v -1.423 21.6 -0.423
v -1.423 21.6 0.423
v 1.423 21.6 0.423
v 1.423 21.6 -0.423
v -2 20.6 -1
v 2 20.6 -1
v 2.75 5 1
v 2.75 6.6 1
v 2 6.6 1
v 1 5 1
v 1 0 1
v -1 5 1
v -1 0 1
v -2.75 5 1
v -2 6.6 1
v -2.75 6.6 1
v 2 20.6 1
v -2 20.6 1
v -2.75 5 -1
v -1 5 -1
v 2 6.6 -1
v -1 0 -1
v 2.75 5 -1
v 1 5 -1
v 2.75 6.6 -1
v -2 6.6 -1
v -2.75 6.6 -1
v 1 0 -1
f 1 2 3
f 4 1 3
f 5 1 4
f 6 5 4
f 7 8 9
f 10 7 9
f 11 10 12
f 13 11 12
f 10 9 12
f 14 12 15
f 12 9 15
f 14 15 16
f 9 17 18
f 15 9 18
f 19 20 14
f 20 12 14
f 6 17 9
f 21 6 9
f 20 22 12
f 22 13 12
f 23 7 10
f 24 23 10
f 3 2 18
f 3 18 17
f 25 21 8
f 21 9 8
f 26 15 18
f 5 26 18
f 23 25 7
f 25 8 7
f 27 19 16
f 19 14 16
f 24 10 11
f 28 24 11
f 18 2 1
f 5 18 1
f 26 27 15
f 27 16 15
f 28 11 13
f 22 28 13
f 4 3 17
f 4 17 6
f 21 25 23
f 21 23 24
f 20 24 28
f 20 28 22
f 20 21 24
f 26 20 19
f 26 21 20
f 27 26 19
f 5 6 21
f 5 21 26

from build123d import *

# Parameters (mm, degrees)
EXTRUDE_1_DEPTH        = 1
CHAMFER_1_SIZE         = 1
CHAMFER_1_SIZE2        = 0.577350269
CHAMFER_1_PART_2_SIZE  = 1
CHAMFER_1_PART_2_SIZE2 = 0.577350269
CHAMFER_1_PART_3_SIZE  = 1
CHAMFER_1_PART_3_SIZE2 = 0.577350269
CHAMFER_1_PART_4_SIZE  = 1
CHAMFER_1_PART_4_SIZE2 = 0.577350269


with BuildPart() as part:
    # Эскиз1 → Бобышка-Вытянуть1 (new body, symmetric)
    with BuildSketch(Plane.XY):
        Polygon((1, 0), (-1, 0), (-1, 5), (-2.75, 5), (-2.75, 6.6), (-2, 6.6), (-2, 21.6), (2, 21.6), (2, 6.6), (2.75, 6.6), (2.75, 5), (1, 5), align=None)
    extrude(amount=EXTRUDE_1_DEPTH, both=True)

    # Фаска1
    chamfer_1_edges = [part.edges().sort_by_distance(p)[0] for p in [
        (0, 21.6, -1),
    ]]
    chamfer_1_side = [part.faces().sort_by_distance(p)[0] for p in [
        (0, 11.701015228, -1),
    ]]
    chamfer(chamfer_1_edges, length=CHAMFER_1_SIZE, length2=CHAMFER_1_SIZE2, reference=chamfer_1_side[0])

    # Фаска1 part 2
    chamfer_1_part_2_edges = [part.edges().sort_by_distance(p)[0] for p in [
        (-2, 21.6, 0),
    ]]
    chamfer_1_part_2_side = [part.faces().sort_by_distance(p)[0] for p in [
        (-2, 14.1, 0),
    ]]
    chamfer(chamfer_1_part_2_edges, length=CHAMFER_1_PART_2_SIZE, length2=CHAMFER_1_PART_2_SIZE2, reference=chamfer_1_part_2_side[0])

    # Фаска1 part 3
    chamfer_1_part_3_edges = [part.edges().sort_by_distance(p)[0] for p in [
        (2, 21.6, 0),
    ]]
    chamfer_1_part_3_side = [part.faces().sort_by_distance(p)[0] for p in [
        (2, 14.1, 0),
    ]]
    chamfer(chamfer_1_part_3_edges, length=CHAMFER_1_PART_3_SIZE, length2=CHAMFER_1_PART_3_SIZE2, reference=chamfer_1_part_3_side[0])

    # Фаска1 part 4
    chamfer_1_part_4_edges = [part.edges().sort_by_distance(p)[0] for p in [
        (0, 21.6, 1),
    ]]
    chamfer_1_part_4_side = [part.faces().sort_by_distance(p)[0] for p in [
        (0, 11.701015228, 1),
    ]]
    chamfer(chamfer_1_part_4_edges, length=CHAMFER_1_PART_4_SIZE, length2=CHAMFER_1_PART_4_SIZE2, reference=chamfer_1_part_4_side[0])


solid = part.part
